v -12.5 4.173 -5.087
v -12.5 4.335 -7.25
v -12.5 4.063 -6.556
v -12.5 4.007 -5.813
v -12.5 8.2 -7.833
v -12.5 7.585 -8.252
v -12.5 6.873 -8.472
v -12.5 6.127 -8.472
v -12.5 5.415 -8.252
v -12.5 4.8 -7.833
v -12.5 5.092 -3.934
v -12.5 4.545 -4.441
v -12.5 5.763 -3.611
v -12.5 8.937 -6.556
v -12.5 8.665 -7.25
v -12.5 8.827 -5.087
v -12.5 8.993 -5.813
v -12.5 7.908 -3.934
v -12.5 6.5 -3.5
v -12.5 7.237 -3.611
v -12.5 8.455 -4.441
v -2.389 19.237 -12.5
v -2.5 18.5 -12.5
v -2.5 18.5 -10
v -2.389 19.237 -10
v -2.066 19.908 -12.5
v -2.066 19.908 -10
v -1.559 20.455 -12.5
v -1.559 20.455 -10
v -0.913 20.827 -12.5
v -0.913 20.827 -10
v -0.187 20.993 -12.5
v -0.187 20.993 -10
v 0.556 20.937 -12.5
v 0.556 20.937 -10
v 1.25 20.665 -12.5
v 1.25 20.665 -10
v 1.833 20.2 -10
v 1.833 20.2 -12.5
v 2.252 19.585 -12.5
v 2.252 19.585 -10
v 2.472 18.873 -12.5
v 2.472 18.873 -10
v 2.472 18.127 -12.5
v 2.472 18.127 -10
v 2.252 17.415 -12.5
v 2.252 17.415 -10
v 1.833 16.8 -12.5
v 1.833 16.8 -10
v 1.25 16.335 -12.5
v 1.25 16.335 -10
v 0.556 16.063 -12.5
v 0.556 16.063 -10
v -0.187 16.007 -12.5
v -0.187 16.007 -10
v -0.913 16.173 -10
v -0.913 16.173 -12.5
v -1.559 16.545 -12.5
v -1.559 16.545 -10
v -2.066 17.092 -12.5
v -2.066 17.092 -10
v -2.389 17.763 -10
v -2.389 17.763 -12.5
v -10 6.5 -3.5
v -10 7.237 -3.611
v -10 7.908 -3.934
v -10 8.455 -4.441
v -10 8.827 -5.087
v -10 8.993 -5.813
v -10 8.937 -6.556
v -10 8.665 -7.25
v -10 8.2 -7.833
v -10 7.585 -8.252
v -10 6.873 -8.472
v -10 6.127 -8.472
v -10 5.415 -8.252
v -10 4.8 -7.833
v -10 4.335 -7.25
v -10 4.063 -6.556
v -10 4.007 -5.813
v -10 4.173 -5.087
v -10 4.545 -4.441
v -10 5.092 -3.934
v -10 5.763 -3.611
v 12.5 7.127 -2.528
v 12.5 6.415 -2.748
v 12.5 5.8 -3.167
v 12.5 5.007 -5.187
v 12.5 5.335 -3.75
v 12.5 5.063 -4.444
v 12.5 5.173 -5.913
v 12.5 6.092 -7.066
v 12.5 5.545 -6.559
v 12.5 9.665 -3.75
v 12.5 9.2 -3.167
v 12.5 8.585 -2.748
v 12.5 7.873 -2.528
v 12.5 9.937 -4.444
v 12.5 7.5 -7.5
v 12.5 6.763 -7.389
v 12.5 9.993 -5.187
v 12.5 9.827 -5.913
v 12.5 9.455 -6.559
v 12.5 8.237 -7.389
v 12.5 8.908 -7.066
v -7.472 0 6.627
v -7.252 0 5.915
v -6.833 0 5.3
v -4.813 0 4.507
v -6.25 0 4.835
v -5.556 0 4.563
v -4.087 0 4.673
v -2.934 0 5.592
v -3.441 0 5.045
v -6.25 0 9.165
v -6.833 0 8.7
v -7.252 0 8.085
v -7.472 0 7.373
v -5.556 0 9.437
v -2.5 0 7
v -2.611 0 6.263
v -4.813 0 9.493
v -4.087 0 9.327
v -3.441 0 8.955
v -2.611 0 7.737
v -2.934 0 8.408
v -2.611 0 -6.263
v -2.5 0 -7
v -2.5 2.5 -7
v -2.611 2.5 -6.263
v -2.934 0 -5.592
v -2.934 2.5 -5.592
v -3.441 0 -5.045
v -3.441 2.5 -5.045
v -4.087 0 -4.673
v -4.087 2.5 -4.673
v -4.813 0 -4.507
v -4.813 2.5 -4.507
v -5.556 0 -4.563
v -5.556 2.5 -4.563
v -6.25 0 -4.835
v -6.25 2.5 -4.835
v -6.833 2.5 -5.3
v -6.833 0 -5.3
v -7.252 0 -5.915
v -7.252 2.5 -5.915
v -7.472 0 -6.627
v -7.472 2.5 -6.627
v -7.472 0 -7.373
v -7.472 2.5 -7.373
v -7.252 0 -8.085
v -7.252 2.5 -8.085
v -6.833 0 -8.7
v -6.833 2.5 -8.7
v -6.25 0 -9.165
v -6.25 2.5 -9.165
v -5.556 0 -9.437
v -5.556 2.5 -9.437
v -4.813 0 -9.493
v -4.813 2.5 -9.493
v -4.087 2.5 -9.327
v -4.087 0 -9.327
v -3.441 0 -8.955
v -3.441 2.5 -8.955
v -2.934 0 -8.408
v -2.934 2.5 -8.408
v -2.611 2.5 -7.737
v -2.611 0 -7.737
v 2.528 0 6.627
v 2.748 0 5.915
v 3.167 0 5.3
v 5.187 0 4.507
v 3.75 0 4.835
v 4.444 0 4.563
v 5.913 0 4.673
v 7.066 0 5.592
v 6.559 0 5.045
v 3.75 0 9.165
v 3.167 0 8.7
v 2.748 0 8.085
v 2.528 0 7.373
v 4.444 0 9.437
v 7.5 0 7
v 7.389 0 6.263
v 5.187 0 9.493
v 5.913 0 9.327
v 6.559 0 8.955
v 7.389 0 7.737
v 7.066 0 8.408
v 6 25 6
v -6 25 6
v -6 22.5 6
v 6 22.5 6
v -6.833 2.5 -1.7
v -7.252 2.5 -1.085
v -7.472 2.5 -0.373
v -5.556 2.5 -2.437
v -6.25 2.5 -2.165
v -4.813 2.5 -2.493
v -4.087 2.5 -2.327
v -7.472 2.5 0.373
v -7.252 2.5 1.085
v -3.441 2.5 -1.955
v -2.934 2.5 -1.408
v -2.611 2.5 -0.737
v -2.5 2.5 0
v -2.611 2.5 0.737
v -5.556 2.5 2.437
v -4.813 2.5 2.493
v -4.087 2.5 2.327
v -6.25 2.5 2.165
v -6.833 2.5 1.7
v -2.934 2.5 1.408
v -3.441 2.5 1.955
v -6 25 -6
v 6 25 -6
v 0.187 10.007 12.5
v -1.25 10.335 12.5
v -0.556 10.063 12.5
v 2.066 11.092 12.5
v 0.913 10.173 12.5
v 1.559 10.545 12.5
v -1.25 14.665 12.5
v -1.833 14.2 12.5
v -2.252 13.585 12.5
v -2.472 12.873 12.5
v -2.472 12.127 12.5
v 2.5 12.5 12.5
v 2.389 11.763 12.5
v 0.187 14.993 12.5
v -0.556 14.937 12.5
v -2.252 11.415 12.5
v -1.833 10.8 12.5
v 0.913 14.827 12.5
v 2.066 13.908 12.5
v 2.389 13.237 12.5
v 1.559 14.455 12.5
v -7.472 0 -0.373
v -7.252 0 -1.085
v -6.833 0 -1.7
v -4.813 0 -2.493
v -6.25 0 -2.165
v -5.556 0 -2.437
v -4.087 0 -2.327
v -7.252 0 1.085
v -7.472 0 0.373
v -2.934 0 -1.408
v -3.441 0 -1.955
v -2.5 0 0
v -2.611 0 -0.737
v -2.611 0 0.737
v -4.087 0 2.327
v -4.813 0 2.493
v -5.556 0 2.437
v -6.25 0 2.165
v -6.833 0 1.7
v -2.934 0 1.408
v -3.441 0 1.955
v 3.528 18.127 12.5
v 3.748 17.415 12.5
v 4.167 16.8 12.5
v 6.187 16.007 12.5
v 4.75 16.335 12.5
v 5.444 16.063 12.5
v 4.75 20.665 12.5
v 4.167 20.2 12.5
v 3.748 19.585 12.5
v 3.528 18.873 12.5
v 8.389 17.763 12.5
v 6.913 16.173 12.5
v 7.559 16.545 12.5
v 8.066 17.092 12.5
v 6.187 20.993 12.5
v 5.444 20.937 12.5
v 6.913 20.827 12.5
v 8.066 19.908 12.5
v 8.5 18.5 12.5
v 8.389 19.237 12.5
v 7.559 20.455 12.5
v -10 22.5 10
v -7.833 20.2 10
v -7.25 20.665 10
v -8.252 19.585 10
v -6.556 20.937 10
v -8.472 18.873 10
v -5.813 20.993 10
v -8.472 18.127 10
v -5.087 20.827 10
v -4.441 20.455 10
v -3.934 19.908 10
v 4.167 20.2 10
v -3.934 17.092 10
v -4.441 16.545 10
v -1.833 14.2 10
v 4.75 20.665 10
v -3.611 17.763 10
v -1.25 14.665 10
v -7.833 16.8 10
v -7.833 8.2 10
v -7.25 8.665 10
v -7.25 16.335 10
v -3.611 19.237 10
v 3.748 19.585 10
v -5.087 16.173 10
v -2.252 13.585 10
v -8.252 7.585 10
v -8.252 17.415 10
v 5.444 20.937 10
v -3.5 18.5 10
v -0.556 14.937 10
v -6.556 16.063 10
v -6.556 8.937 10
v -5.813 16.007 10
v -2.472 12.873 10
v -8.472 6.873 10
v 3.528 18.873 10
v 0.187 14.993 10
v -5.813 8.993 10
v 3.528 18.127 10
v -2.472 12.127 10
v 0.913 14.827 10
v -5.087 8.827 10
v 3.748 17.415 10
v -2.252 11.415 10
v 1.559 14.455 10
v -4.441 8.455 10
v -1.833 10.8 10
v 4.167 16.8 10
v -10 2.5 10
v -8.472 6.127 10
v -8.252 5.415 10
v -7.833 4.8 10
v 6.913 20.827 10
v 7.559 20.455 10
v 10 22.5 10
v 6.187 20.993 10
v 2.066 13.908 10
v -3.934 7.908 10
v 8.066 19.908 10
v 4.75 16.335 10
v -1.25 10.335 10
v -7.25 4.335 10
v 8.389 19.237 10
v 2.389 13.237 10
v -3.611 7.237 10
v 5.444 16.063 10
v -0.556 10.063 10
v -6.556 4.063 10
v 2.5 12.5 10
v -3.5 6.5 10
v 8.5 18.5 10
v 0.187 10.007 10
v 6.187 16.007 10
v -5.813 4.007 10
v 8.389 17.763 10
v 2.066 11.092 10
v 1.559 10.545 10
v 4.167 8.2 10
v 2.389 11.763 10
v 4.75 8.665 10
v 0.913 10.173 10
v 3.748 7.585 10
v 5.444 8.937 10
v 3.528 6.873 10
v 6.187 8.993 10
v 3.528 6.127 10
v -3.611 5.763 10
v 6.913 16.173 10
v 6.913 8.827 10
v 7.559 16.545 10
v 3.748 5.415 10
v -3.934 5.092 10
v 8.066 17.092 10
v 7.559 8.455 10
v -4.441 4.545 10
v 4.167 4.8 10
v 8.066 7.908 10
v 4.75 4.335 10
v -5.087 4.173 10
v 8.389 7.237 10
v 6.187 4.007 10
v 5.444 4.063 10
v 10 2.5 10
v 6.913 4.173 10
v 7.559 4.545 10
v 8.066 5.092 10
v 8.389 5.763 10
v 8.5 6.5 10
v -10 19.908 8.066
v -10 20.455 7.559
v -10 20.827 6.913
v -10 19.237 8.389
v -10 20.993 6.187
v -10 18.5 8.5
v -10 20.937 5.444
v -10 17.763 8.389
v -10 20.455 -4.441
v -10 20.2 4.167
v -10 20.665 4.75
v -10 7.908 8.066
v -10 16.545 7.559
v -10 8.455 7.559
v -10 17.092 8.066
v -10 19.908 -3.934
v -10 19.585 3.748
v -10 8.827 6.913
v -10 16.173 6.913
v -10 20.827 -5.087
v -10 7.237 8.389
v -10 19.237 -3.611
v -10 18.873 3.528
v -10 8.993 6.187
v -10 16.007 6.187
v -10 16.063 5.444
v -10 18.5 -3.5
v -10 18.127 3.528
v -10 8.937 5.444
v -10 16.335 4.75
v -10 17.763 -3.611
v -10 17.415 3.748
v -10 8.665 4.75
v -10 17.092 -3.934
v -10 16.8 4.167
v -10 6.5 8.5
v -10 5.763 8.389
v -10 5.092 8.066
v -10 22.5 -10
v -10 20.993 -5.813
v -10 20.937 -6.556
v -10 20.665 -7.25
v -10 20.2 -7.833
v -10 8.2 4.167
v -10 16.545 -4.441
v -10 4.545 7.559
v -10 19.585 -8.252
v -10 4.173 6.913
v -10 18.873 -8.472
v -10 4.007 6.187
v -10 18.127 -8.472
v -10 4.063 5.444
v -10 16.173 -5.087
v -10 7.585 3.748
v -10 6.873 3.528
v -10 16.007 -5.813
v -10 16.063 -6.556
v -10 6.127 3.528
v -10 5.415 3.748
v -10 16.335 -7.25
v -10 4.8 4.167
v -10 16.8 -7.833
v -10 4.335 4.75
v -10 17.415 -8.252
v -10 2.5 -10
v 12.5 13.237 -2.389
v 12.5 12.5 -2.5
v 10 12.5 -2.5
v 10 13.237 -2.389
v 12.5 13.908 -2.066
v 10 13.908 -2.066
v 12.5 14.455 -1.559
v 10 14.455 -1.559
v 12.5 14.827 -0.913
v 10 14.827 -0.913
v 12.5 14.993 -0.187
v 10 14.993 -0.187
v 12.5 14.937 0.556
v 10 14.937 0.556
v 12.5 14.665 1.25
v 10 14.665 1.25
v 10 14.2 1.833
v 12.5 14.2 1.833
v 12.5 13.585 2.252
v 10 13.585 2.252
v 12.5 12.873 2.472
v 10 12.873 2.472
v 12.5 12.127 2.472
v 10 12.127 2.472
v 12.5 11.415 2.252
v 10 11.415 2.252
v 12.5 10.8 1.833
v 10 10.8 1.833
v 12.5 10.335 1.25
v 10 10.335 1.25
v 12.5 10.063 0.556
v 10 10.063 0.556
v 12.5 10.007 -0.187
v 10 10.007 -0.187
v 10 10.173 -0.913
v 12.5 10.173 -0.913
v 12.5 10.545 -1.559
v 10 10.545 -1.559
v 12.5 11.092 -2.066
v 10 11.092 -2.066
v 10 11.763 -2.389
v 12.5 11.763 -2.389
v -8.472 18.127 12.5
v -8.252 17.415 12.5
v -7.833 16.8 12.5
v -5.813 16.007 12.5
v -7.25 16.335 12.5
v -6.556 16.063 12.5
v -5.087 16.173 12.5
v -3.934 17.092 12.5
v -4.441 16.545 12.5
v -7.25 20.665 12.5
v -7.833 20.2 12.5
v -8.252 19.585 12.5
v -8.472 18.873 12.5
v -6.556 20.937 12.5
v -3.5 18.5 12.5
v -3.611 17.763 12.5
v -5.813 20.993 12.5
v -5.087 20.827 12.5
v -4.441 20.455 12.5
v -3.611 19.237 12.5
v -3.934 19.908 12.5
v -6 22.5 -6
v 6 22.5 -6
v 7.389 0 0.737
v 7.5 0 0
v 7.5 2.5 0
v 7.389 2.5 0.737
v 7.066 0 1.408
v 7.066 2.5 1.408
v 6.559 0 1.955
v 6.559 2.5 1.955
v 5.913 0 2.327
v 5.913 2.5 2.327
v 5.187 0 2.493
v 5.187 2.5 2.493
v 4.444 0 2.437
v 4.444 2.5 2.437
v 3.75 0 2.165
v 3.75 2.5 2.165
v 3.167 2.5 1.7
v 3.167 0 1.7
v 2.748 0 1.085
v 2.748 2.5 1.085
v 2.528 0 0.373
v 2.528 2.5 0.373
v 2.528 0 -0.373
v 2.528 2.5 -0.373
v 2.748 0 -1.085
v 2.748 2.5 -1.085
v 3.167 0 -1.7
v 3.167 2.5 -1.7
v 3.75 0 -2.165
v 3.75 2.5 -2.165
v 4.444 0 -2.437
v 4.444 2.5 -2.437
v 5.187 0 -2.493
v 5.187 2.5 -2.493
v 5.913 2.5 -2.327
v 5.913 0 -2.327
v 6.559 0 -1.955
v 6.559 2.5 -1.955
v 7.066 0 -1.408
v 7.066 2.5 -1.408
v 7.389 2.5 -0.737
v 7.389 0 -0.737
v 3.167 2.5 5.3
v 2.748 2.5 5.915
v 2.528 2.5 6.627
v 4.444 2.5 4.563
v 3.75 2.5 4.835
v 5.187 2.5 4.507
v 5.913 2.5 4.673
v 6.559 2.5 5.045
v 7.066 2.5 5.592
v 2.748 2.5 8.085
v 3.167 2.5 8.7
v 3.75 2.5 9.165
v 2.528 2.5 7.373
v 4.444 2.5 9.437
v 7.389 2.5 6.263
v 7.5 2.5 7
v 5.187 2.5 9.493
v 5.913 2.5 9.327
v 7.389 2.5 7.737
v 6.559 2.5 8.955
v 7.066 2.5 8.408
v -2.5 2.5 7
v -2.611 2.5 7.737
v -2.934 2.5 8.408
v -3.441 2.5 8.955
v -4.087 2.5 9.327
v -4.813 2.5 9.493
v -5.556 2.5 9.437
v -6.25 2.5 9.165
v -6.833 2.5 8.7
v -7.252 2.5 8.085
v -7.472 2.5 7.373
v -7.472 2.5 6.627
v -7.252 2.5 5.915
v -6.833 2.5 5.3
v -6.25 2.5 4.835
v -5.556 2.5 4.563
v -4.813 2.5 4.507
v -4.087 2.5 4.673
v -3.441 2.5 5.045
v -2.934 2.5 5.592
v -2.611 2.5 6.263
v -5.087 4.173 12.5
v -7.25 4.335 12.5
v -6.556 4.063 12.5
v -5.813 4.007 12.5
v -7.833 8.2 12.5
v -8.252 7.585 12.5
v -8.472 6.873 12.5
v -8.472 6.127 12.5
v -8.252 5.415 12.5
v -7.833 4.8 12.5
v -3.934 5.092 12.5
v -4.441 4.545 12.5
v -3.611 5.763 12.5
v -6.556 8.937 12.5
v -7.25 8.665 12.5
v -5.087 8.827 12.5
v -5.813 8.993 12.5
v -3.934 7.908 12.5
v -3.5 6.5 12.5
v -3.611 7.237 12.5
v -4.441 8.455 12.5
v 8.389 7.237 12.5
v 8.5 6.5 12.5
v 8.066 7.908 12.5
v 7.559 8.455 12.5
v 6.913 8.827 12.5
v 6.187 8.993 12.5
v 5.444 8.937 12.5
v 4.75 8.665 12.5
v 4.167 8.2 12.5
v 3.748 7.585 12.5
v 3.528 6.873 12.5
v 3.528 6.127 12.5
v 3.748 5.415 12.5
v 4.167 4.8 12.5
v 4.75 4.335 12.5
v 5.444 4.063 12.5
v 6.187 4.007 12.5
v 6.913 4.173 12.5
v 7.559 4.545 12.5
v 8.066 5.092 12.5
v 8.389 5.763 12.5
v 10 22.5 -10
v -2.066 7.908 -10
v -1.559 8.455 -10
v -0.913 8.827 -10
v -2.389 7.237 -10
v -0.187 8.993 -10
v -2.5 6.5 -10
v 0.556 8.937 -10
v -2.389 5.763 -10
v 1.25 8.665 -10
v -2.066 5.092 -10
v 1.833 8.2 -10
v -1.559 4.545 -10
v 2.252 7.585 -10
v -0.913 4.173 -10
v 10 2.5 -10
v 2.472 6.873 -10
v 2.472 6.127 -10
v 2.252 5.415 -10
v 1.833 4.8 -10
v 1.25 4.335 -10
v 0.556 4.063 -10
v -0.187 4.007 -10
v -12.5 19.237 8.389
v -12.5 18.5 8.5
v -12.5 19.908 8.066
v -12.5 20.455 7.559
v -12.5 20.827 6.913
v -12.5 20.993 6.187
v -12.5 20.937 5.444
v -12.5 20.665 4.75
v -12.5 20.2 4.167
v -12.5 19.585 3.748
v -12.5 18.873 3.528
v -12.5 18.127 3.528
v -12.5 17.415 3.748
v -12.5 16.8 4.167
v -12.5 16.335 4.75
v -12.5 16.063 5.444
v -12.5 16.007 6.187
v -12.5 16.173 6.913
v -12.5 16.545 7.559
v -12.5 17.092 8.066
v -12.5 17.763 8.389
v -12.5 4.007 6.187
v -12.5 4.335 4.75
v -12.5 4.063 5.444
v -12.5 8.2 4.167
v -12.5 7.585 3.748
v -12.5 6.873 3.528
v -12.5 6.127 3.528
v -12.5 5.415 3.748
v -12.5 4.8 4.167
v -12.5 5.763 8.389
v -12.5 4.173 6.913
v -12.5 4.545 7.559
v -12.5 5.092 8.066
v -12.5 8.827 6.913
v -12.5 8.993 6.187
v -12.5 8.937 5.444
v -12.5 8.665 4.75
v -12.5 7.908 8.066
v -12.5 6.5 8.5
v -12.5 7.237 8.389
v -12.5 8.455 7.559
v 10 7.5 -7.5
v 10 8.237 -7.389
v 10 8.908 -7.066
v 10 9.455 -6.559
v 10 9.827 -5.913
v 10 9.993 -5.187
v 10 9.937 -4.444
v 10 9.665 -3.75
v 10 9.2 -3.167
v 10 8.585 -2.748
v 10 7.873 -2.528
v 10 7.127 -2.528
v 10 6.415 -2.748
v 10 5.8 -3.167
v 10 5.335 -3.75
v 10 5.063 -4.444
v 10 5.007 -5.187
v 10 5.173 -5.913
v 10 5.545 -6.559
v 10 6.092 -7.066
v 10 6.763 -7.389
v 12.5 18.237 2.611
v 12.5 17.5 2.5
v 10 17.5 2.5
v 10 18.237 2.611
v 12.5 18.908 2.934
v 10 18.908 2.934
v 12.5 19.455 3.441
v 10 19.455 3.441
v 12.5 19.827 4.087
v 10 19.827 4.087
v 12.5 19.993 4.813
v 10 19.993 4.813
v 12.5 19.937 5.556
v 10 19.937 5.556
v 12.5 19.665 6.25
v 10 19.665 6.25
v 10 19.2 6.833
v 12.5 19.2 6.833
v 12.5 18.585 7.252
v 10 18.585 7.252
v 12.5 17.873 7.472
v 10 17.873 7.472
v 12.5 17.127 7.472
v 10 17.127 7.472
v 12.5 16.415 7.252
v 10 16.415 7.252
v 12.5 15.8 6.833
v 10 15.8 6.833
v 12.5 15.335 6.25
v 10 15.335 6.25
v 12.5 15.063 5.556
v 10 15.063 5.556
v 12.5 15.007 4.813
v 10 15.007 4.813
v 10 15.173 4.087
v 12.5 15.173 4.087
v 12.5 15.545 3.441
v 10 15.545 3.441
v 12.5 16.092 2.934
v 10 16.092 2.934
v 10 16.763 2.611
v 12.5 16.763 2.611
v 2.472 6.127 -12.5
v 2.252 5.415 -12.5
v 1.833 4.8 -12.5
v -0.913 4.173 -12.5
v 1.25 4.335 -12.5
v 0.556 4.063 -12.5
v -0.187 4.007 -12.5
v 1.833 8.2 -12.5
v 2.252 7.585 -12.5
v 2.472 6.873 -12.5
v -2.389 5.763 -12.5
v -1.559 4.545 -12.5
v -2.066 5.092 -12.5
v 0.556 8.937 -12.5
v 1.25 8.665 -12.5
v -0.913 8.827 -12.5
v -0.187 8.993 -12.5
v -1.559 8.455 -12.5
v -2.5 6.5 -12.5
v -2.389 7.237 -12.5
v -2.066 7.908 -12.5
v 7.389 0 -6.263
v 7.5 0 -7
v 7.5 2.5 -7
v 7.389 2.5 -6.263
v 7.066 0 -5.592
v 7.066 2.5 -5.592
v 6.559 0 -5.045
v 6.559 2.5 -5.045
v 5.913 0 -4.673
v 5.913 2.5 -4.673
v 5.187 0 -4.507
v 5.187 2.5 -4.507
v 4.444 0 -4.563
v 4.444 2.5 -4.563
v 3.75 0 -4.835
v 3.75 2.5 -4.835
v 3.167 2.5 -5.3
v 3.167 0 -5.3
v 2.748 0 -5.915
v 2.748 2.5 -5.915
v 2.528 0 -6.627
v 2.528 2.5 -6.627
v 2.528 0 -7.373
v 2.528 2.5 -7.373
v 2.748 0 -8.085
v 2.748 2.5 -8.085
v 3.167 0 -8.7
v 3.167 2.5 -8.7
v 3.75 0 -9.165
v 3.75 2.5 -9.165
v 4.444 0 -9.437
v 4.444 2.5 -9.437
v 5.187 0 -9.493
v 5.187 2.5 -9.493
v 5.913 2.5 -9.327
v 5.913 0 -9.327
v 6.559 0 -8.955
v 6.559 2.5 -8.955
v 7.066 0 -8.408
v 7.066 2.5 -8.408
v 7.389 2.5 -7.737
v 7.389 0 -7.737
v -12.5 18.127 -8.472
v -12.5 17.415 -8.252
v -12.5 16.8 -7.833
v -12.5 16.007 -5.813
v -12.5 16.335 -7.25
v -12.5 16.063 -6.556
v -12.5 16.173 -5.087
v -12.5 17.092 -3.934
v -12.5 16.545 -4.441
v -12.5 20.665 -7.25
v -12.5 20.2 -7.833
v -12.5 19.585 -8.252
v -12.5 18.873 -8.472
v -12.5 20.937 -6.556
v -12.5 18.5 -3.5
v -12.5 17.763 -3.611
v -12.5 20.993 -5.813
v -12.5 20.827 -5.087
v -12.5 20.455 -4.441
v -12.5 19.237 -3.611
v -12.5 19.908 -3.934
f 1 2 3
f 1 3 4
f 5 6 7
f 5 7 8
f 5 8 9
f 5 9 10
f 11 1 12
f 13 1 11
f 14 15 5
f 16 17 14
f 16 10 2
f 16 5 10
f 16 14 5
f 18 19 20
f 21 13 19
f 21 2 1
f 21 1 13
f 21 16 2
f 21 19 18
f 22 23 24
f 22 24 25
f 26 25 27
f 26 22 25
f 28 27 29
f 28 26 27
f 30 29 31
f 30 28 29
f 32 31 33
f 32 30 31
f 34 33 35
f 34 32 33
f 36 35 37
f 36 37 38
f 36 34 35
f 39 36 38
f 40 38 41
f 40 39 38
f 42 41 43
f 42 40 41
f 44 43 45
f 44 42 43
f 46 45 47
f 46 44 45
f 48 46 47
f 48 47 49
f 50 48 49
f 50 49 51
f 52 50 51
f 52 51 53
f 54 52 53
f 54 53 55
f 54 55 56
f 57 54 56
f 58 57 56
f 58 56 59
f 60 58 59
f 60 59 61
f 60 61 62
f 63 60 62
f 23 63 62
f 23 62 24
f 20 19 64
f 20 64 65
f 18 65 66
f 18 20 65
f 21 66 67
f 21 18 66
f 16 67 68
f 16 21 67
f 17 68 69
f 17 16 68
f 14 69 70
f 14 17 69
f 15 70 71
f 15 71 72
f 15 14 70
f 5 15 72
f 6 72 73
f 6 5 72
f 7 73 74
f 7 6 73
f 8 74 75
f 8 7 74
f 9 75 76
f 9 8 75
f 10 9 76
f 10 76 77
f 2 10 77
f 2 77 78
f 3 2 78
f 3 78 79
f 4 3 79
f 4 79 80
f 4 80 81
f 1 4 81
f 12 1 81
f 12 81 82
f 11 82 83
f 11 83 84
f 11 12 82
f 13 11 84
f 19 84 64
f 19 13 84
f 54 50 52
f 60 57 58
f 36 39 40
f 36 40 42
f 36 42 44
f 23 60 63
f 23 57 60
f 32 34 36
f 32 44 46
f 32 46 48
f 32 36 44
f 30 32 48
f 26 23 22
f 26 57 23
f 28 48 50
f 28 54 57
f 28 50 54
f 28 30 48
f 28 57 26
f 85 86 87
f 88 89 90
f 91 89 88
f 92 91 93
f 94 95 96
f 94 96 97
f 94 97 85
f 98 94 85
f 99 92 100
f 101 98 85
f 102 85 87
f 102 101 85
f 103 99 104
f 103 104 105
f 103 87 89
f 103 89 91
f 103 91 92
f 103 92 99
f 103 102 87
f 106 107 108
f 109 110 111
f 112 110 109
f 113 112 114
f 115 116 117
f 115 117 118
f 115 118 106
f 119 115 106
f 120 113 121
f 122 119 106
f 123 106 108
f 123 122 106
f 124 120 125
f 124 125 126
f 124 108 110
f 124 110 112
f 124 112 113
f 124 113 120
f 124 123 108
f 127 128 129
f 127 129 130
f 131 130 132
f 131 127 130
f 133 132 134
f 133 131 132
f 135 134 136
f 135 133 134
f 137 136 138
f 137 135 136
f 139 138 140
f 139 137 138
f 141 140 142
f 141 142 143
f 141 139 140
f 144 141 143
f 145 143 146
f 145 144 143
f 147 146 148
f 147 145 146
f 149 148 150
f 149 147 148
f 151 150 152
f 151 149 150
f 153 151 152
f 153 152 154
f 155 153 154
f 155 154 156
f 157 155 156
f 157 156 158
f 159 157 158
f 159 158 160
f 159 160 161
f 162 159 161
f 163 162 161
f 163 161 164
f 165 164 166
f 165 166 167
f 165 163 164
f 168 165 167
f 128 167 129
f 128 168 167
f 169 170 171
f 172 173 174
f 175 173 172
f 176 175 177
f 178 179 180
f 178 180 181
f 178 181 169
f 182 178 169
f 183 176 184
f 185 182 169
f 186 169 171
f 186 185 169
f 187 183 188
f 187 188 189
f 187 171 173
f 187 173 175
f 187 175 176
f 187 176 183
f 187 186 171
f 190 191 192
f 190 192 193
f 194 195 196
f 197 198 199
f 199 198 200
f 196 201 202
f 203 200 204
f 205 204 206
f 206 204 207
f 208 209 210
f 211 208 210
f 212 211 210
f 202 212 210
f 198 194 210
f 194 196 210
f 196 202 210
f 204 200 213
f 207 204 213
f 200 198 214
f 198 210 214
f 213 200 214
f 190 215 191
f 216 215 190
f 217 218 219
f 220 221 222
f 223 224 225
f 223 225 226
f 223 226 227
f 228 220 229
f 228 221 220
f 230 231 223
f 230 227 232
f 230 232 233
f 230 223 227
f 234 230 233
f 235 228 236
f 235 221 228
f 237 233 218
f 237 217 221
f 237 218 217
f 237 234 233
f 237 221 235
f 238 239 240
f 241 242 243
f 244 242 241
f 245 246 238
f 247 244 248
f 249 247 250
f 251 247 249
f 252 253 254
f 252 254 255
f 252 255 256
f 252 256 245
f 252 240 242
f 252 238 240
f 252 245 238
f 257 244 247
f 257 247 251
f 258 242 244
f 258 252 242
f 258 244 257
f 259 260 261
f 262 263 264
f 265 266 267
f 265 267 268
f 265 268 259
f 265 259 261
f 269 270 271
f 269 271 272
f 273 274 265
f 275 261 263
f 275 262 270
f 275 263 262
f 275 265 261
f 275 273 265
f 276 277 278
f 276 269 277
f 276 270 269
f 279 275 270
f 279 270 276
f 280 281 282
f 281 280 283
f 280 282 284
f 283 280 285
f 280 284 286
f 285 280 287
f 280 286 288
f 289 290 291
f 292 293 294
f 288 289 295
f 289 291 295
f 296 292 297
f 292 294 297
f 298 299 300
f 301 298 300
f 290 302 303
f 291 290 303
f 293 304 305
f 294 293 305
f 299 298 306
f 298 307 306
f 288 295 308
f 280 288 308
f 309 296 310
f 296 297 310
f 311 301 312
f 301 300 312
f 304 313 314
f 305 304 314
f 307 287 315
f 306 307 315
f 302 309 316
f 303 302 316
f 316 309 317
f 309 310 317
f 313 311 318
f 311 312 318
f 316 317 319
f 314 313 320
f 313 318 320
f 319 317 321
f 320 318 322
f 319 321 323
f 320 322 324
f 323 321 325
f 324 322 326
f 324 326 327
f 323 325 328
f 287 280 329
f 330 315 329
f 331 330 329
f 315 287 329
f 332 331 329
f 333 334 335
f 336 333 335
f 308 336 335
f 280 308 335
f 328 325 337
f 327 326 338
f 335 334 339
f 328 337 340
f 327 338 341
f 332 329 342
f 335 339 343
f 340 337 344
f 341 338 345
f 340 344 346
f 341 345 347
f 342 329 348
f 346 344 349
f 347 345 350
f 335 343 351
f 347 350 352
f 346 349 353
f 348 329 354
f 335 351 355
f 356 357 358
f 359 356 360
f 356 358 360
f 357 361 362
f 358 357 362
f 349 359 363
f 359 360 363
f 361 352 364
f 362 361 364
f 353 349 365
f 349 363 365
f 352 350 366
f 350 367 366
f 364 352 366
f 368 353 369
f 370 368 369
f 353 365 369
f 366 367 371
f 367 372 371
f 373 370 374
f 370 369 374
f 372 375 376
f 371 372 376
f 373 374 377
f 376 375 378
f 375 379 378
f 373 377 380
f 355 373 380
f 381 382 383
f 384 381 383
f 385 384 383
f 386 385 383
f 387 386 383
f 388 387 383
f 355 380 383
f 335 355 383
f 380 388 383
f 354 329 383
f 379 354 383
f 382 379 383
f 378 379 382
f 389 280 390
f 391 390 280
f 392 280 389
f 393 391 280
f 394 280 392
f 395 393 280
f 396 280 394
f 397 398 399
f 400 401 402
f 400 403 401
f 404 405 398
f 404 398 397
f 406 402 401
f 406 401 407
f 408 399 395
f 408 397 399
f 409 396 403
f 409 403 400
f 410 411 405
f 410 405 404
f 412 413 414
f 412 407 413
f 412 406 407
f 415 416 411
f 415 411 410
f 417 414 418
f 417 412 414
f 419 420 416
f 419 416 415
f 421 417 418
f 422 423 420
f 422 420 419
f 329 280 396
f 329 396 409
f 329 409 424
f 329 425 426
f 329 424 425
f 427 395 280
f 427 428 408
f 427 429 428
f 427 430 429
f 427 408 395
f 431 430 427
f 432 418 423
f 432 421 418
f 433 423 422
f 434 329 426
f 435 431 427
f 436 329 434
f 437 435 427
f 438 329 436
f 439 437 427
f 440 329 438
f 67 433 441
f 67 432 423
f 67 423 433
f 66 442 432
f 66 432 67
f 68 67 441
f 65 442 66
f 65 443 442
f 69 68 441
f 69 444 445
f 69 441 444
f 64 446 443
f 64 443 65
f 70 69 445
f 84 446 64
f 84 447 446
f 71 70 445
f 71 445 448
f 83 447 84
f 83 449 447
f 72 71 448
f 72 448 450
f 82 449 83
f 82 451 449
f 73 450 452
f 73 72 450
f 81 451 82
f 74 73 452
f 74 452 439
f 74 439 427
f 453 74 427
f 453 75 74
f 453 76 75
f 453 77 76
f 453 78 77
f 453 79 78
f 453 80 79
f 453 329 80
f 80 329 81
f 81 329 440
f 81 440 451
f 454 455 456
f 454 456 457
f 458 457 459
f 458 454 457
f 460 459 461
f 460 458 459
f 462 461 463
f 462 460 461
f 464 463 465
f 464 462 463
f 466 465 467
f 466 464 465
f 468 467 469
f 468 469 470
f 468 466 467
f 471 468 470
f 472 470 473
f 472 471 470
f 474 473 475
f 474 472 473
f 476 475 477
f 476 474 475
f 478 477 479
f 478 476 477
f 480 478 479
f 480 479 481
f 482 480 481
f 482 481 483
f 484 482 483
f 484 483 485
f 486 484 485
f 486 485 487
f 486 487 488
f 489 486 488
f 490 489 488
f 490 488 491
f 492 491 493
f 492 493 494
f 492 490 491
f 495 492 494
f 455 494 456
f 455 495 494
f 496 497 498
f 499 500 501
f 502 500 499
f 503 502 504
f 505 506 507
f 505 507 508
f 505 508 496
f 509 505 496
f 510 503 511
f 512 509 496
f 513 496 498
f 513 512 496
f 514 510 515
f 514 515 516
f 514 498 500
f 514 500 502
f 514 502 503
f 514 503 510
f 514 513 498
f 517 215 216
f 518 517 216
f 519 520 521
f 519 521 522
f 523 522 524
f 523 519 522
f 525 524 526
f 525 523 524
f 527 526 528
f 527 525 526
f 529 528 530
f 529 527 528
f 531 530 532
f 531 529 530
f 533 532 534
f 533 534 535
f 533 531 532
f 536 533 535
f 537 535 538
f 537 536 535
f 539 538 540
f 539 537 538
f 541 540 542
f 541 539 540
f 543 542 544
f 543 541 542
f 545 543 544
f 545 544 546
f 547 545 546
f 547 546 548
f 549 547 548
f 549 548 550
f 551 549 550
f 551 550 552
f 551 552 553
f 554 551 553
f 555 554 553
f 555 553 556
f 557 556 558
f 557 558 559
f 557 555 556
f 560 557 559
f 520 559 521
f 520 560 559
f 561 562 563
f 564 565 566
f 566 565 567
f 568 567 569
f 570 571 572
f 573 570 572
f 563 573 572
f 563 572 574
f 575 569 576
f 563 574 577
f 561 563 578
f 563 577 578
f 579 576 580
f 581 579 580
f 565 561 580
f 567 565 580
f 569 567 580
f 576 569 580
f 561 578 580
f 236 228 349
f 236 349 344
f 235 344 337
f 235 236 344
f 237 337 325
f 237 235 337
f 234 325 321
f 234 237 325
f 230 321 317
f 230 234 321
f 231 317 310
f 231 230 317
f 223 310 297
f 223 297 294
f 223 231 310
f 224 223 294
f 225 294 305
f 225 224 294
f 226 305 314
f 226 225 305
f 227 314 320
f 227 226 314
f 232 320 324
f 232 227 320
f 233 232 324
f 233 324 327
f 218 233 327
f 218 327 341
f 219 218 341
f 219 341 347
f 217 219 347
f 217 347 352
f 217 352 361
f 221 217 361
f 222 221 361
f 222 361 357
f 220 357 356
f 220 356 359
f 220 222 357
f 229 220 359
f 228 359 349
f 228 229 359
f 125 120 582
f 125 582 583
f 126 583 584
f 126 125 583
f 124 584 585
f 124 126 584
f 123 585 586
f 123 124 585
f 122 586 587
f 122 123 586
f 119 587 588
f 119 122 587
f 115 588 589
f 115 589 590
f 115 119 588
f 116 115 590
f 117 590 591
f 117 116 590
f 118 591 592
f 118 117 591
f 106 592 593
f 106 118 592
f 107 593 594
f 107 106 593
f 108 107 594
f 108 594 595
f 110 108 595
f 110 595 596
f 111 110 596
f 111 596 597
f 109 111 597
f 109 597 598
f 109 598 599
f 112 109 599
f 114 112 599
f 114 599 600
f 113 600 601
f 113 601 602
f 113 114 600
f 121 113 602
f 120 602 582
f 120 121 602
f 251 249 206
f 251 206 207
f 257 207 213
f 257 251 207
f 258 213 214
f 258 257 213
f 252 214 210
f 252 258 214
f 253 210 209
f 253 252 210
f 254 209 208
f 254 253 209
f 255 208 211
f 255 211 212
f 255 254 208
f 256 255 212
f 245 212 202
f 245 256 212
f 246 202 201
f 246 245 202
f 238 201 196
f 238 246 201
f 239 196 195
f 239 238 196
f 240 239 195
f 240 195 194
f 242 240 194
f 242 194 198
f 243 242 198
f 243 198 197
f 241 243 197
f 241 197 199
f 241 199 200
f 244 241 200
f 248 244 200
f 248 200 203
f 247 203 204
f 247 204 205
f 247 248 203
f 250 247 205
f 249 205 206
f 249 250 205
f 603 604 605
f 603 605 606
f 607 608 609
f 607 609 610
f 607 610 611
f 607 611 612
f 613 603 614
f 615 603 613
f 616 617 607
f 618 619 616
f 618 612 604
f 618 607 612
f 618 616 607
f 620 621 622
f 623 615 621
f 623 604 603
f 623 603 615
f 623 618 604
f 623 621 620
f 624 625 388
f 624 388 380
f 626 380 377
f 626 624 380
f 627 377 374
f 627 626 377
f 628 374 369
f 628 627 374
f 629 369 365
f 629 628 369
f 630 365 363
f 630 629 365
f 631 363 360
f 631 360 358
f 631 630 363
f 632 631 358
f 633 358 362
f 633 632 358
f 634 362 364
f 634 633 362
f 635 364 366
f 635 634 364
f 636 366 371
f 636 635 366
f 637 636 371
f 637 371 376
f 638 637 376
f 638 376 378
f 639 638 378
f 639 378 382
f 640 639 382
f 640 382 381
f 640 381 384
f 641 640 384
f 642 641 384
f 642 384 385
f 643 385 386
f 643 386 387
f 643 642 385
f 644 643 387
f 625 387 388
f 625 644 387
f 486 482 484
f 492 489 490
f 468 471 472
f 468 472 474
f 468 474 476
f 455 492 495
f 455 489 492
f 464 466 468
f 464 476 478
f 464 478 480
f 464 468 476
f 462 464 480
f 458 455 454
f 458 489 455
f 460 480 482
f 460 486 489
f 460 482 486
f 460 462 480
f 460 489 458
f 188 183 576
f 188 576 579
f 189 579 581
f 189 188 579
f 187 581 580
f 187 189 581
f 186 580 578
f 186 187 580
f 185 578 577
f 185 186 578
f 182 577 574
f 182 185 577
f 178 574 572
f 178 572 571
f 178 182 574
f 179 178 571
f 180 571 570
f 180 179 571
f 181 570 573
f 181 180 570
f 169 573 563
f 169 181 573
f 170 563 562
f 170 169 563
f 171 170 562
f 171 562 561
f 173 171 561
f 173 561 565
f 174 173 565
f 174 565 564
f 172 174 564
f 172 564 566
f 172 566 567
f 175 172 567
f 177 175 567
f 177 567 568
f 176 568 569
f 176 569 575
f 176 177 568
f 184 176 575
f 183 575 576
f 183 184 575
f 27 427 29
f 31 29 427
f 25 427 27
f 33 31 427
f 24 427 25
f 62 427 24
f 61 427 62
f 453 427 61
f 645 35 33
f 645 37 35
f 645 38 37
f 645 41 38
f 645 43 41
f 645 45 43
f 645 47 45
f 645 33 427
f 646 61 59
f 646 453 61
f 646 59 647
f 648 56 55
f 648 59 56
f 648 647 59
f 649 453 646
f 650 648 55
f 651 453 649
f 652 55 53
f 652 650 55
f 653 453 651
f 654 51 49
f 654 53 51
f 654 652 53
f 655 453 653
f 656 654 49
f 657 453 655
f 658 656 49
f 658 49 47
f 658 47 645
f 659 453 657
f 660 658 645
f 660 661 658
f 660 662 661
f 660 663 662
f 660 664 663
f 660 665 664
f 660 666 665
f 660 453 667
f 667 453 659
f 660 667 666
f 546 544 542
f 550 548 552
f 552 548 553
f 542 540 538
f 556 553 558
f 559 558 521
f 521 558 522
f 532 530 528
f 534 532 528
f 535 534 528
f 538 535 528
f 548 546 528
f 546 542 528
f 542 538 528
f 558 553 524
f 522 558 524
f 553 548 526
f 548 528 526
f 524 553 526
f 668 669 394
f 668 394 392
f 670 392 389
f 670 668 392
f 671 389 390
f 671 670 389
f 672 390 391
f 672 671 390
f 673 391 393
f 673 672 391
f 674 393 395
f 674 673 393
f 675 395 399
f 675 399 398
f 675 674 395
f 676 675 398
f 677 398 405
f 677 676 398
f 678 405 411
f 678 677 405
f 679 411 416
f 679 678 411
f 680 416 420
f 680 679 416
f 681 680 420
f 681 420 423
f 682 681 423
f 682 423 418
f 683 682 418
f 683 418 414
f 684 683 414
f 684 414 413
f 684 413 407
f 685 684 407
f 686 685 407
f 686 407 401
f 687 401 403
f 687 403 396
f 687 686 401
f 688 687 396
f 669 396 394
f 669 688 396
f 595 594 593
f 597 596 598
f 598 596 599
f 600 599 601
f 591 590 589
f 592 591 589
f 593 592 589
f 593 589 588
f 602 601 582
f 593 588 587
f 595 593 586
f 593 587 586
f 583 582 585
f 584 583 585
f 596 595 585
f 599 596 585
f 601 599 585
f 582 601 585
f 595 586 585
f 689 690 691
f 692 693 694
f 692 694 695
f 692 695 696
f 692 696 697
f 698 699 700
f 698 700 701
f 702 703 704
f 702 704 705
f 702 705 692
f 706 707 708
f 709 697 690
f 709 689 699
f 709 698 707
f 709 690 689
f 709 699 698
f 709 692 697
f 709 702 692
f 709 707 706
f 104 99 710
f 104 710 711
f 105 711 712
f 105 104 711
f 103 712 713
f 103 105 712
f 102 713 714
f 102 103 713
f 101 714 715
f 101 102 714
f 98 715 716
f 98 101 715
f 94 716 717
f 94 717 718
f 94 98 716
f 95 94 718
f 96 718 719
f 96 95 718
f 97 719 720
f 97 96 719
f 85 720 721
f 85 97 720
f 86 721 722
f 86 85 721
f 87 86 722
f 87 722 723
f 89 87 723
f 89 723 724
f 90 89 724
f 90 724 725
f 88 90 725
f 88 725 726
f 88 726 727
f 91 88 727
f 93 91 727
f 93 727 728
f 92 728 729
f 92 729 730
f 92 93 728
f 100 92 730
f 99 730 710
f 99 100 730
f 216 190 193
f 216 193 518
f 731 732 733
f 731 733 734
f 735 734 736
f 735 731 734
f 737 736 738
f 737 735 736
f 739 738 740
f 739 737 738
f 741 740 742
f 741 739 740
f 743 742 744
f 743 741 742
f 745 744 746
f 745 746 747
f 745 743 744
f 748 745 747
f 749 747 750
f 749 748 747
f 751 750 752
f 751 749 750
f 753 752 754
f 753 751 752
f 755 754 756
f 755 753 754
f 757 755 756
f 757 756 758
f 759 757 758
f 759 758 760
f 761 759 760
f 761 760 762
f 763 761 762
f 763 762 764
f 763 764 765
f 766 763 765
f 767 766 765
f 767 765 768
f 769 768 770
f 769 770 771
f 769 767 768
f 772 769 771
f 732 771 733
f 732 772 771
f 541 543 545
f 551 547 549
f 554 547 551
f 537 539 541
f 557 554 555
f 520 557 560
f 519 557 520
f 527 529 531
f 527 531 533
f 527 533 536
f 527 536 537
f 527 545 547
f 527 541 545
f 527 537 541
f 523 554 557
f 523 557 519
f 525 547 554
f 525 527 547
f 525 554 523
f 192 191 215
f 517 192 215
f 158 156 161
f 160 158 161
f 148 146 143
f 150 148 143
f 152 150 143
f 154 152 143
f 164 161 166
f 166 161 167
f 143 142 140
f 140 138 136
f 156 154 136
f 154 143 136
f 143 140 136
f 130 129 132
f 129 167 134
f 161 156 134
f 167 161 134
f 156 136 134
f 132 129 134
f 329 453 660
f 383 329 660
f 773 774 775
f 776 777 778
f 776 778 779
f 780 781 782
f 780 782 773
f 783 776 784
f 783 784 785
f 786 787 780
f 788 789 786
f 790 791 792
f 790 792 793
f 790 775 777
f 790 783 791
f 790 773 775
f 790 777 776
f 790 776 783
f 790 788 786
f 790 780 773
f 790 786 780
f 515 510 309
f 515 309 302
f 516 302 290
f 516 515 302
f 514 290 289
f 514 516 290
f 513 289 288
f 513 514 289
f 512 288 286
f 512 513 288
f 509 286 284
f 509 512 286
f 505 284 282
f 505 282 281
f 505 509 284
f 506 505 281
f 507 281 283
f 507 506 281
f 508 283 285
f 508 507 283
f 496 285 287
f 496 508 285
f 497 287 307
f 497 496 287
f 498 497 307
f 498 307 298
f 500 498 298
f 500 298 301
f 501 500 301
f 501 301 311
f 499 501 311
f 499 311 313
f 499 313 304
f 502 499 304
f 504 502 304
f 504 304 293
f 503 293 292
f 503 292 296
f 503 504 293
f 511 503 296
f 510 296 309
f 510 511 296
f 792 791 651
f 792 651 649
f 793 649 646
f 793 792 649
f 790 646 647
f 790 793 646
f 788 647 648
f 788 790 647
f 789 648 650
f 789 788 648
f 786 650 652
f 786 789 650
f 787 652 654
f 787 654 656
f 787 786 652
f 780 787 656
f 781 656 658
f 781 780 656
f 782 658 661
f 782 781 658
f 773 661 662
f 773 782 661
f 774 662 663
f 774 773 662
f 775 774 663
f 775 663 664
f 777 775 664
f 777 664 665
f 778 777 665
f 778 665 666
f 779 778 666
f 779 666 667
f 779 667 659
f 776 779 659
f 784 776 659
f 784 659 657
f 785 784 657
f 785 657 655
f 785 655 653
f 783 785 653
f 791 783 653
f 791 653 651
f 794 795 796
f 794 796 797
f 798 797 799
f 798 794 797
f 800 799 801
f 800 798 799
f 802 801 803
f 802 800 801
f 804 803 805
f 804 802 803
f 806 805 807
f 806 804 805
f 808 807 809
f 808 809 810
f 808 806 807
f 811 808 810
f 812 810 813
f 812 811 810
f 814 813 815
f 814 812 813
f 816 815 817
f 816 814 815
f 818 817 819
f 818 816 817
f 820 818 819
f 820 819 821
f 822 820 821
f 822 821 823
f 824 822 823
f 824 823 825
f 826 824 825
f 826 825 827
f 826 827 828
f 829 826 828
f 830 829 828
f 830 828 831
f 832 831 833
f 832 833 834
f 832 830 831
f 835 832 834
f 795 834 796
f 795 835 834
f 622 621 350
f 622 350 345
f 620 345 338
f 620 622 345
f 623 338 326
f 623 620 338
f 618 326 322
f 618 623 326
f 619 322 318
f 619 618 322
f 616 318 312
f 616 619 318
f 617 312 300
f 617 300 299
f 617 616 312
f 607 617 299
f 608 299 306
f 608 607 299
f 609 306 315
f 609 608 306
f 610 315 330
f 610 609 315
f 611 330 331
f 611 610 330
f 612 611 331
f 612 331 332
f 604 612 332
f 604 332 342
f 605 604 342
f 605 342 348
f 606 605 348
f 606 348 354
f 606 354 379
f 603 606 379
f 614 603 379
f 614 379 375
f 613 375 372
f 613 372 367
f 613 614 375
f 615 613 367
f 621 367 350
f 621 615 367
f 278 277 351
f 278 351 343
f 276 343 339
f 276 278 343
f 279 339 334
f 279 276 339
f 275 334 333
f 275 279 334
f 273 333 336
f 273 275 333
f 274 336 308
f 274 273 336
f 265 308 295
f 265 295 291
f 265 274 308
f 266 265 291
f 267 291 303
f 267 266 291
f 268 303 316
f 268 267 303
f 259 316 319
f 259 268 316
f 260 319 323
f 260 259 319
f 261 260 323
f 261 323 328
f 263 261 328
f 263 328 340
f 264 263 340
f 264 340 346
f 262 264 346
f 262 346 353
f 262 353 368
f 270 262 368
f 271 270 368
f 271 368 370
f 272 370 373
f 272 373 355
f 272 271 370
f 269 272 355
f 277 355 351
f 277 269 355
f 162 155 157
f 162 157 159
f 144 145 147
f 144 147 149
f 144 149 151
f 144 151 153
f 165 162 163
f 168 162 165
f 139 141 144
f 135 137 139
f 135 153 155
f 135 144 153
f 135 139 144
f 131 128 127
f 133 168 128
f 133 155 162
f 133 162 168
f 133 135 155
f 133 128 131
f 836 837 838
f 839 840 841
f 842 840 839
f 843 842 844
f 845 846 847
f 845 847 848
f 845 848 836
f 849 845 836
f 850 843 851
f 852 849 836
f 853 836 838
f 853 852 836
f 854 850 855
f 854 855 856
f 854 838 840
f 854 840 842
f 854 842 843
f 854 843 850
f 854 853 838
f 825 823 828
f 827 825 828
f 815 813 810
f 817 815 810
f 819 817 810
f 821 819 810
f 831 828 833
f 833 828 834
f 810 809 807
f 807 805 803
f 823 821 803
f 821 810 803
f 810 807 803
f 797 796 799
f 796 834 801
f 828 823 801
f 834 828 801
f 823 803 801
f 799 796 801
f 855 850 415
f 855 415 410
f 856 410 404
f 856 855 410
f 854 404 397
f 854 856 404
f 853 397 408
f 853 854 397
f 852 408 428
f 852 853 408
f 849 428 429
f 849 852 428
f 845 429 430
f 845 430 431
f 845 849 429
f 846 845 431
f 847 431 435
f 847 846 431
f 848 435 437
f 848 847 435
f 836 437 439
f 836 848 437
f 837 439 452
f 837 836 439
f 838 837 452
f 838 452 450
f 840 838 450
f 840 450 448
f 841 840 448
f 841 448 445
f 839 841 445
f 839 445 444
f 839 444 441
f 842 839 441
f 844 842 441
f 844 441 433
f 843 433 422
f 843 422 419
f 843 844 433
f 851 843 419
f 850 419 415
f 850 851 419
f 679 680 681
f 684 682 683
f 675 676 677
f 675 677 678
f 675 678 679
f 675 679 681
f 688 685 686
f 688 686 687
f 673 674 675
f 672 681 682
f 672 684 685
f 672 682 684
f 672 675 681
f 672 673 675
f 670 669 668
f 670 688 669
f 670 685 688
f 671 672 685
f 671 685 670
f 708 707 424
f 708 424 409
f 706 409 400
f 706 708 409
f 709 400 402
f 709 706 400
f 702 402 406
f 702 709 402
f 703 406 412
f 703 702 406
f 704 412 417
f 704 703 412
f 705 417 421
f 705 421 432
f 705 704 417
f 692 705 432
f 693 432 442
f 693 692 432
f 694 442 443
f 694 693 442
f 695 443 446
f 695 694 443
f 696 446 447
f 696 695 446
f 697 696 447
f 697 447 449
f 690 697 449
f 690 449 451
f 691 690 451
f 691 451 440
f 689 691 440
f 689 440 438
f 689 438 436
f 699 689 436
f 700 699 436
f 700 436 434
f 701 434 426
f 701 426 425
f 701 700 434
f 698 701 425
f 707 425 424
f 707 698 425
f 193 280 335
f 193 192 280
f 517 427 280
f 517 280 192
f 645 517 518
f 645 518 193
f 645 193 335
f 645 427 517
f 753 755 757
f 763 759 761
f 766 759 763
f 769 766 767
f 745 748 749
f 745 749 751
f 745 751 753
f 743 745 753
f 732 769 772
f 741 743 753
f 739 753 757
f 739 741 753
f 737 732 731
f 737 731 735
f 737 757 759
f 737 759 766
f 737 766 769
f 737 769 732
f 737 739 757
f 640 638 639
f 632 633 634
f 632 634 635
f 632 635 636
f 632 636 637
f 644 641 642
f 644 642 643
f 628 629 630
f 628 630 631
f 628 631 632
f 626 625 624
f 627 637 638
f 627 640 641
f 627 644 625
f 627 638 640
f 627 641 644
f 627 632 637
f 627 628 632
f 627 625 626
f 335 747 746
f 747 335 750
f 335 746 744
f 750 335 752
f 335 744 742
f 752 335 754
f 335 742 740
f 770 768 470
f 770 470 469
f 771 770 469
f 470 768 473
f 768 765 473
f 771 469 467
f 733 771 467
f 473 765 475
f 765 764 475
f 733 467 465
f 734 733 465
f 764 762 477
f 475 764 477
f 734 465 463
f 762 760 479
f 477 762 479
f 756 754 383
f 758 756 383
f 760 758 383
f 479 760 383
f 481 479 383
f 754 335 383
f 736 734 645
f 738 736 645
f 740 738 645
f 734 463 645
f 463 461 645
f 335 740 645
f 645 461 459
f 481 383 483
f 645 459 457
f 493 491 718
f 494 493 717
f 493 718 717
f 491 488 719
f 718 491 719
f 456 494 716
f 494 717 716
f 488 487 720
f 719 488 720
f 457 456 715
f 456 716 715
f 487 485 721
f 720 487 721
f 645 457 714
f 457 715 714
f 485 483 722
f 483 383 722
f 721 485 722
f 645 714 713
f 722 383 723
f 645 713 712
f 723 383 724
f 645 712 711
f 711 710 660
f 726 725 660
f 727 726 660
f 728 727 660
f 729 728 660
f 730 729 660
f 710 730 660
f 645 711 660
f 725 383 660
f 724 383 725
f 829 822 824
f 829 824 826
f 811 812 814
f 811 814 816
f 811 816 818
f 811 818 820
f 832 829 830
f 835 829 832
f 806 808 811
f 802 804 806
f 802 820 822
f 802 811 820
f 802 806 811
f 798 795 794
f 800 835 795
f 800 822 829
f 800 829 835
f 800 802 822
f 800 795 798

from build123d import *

# Parameters (mm, degrees)
SKETCH1_W             = 25
SKETCH1_H             = 25
BOSS_EXTRUDE1_DEPTH   = 25
SCALE1_SCALE          = 0.8
SKETCH3_R             = 2.5
BOSS_EXTRUDE2_DEPTH   = 2.5
BOSS_EXTRUDE2_2_DEPTH = 2.5
BOSS_EXTRUDE2_3_DEPTH = 2.5
BOSS_EXTRUDE2_4_DEPTH = 2.5
BOSS_EXTRUDE2_5_DEPTH = 2.5
BOSS_EXTRUDE2_6_DEPTH = 2.5
SKETCH7_R             = 2.5
BOSS_EXTRUDE3_DEPTH   = 2.5
SKETCH5_R             = 2.5
BOSS_EXTRUDE4_DEPTH   = 2.5
SKETCH4_R             = 2.5
BOSS_EXTRUDE5_DEPTH   = 2.5
SKETCH2_W             = 12
SKETCH2_H             = 12
BOSS_EXTRUDE7_DEPTH   = 2.5
SKETCH8_R             = 2.5
BOSS_EXTRUDE8_DEPTH   = 10


with BuildPart() as part:
    # Sketch1 → Boss-Extrude1 (new body)
    with BuildSketch(Plane(origin=(0, 0, 0), x_dir=(1, 0, 0), z_dir=(0, 1, 0))):
        Rectangle(SKETCH1_W, SKETCH1_H)
    extrude(amount=BOSS_EXTRUDE1_DEPTH)


with BuildPart() as part_1:
    # Scale1: scaled about (0, 12.5, 0)
    add(part.part.scale(SCALE1_SCALE).moved(Location((0, 2.5, 0))))

    # Sketch7 → Boss-Extrude3 (add)
    with BuildSketch(Plane.XY.offset(12.5)):
        with Locations((-6, 18.5)):
            Circle(SKETCH7_R)
        with Locations((0, 12.5)):
            Circle(SKETCH7_R)
        with Locations((6, 18.5)):
            Circle(SKETCH7_R)
        with Locations((6, 6.5)):
            Circle(SKETCH7_R)
        with Locations((-6, 6.5)):
            Circle(SKETCH7_R)
    extrude(amount=-BOSS_EXTRUDE3_DEPTH)

    # Sketch5 → Boss-Extrude4 (add)
    with BuildSketch(Plane.ZY.offset(12.5)):
        with Locations((-6, 18.5)):
            Circle(SKETCH5_R)
        with Locations((6, 18.5)):
            Circle(SKETCH5_R)
        with Locations((6, 6.5)):
            Circle(SKETCH5_R)
        with Locations((-6, 6.5)):
            Circle(SKETCH5_R)
    extrude(amount=-BOSS_EXTRUDE4_DEPTH)

    # Sketch4 → Boss-Extrude5 (add)
    with BuildSketch(Plane(origin=(12.5, 0, 0), x_dir=(0, 0, -1), z_dir=(1, 0, 0))):
        with Locations((-5, 17.5)):
            Circle(SKETCH4_R)
        with Locations((0, 12.5)):
            Circle(SKETCH4_R)
        with Locations((5, 7.5)):
            Circle(SKETCH4_R)
    extrude(amount=-BOSS_EXTRUDE5_DEPTH)

    # Sketch2 → Boss-Extrude7 (add)
    with BuildSketch(Plane(origin=(0, 25, 0), x_dir=(1, 0, 0), z_dir=(0, 1, 0))):
        Rectangle(SKETCH2_W, SKETCH2_H)
    extrude(amount=-BOSS_EXTRUDE7_DEPTH)

    # Sketch8 → Boss-Extrude8 (add)
    with BuildSketch(Plane(origin=(0, 0, -12.5), x_dir=(-1, 0, 0), z_dir=(0, 0, -1))):
        with Locations((0, 6.5)):
            Circle(SKETCH8_R)
        with Locations((0, 18.5)):
            Circle(SKETCH8_R)
    extrude(amount=-BOSS_EXTRUDE8_DEPTH)


with BuildPart() as body_2:
    # Sketch3 → Boss-Extrude2 (new body)
    with BuildSketch(Plane.XZ):
        with Locations((-5, 7)):
            Circle(SKETCH3_R)
    extrude(amount=-BOSS_EXTRUDE2_DEPTH)


with BuildPart() as body_3:
    # Sketch3 → Boss-Extrude2 2 (new body)
    with BuildSketch(Plane.XZ):
        with Locations((-5, 0)):
            Circle(SKETCH3_R)
    extrude(amount=-BOSS_EXTRUDE2_2_DEPTH)


with BuildPart() as body_4:
    # Sketch3 → Boss-Extrude2 3 (new body)
    with BuildSketch(Plane.XZ):
        with Locations((-5, -7)):
            Circle(SKETCH3_R)
    extrude(amount=-BOSS_EXTRUDE2_3_DEPTH)


with BuildPart() as body_5:
    # Sketch3 → Boss-Extrude2 4 (new body)
    with BuildSketch(Plane.XZ):
        with Locations((5, 7)):
            Circle(SKETCH3_R)
    extrude(amount=-BOSS_EXTRUDE2_4_DEPTH)


with BuildPart() as body_6:
    # Sketch3 → Boss-Extrude2 5 (new body)
    with BuildSketch(Plane.XZ):
        with Locations((5, 0)):
            Circle(SKETCH3_R)
    extrude(amount=-BOSS_EXTRUDE2_5_DEPTH)


with BuildPart() as body_7:
    # Sketch3 → Boss-Extrude2 6 (new body)
    with BuildSketch(Plane.XZ):
        with Locations((5, -7)):
            Circle(SKETCH3_R)
    extrude(amount=-BOSS_EXTRUDE2_6_DEPTH)


solid = Compound([part_1.part, body_2.part, body_3.part, body_4.part, body_5.part, body_6.part, body_7.part])
